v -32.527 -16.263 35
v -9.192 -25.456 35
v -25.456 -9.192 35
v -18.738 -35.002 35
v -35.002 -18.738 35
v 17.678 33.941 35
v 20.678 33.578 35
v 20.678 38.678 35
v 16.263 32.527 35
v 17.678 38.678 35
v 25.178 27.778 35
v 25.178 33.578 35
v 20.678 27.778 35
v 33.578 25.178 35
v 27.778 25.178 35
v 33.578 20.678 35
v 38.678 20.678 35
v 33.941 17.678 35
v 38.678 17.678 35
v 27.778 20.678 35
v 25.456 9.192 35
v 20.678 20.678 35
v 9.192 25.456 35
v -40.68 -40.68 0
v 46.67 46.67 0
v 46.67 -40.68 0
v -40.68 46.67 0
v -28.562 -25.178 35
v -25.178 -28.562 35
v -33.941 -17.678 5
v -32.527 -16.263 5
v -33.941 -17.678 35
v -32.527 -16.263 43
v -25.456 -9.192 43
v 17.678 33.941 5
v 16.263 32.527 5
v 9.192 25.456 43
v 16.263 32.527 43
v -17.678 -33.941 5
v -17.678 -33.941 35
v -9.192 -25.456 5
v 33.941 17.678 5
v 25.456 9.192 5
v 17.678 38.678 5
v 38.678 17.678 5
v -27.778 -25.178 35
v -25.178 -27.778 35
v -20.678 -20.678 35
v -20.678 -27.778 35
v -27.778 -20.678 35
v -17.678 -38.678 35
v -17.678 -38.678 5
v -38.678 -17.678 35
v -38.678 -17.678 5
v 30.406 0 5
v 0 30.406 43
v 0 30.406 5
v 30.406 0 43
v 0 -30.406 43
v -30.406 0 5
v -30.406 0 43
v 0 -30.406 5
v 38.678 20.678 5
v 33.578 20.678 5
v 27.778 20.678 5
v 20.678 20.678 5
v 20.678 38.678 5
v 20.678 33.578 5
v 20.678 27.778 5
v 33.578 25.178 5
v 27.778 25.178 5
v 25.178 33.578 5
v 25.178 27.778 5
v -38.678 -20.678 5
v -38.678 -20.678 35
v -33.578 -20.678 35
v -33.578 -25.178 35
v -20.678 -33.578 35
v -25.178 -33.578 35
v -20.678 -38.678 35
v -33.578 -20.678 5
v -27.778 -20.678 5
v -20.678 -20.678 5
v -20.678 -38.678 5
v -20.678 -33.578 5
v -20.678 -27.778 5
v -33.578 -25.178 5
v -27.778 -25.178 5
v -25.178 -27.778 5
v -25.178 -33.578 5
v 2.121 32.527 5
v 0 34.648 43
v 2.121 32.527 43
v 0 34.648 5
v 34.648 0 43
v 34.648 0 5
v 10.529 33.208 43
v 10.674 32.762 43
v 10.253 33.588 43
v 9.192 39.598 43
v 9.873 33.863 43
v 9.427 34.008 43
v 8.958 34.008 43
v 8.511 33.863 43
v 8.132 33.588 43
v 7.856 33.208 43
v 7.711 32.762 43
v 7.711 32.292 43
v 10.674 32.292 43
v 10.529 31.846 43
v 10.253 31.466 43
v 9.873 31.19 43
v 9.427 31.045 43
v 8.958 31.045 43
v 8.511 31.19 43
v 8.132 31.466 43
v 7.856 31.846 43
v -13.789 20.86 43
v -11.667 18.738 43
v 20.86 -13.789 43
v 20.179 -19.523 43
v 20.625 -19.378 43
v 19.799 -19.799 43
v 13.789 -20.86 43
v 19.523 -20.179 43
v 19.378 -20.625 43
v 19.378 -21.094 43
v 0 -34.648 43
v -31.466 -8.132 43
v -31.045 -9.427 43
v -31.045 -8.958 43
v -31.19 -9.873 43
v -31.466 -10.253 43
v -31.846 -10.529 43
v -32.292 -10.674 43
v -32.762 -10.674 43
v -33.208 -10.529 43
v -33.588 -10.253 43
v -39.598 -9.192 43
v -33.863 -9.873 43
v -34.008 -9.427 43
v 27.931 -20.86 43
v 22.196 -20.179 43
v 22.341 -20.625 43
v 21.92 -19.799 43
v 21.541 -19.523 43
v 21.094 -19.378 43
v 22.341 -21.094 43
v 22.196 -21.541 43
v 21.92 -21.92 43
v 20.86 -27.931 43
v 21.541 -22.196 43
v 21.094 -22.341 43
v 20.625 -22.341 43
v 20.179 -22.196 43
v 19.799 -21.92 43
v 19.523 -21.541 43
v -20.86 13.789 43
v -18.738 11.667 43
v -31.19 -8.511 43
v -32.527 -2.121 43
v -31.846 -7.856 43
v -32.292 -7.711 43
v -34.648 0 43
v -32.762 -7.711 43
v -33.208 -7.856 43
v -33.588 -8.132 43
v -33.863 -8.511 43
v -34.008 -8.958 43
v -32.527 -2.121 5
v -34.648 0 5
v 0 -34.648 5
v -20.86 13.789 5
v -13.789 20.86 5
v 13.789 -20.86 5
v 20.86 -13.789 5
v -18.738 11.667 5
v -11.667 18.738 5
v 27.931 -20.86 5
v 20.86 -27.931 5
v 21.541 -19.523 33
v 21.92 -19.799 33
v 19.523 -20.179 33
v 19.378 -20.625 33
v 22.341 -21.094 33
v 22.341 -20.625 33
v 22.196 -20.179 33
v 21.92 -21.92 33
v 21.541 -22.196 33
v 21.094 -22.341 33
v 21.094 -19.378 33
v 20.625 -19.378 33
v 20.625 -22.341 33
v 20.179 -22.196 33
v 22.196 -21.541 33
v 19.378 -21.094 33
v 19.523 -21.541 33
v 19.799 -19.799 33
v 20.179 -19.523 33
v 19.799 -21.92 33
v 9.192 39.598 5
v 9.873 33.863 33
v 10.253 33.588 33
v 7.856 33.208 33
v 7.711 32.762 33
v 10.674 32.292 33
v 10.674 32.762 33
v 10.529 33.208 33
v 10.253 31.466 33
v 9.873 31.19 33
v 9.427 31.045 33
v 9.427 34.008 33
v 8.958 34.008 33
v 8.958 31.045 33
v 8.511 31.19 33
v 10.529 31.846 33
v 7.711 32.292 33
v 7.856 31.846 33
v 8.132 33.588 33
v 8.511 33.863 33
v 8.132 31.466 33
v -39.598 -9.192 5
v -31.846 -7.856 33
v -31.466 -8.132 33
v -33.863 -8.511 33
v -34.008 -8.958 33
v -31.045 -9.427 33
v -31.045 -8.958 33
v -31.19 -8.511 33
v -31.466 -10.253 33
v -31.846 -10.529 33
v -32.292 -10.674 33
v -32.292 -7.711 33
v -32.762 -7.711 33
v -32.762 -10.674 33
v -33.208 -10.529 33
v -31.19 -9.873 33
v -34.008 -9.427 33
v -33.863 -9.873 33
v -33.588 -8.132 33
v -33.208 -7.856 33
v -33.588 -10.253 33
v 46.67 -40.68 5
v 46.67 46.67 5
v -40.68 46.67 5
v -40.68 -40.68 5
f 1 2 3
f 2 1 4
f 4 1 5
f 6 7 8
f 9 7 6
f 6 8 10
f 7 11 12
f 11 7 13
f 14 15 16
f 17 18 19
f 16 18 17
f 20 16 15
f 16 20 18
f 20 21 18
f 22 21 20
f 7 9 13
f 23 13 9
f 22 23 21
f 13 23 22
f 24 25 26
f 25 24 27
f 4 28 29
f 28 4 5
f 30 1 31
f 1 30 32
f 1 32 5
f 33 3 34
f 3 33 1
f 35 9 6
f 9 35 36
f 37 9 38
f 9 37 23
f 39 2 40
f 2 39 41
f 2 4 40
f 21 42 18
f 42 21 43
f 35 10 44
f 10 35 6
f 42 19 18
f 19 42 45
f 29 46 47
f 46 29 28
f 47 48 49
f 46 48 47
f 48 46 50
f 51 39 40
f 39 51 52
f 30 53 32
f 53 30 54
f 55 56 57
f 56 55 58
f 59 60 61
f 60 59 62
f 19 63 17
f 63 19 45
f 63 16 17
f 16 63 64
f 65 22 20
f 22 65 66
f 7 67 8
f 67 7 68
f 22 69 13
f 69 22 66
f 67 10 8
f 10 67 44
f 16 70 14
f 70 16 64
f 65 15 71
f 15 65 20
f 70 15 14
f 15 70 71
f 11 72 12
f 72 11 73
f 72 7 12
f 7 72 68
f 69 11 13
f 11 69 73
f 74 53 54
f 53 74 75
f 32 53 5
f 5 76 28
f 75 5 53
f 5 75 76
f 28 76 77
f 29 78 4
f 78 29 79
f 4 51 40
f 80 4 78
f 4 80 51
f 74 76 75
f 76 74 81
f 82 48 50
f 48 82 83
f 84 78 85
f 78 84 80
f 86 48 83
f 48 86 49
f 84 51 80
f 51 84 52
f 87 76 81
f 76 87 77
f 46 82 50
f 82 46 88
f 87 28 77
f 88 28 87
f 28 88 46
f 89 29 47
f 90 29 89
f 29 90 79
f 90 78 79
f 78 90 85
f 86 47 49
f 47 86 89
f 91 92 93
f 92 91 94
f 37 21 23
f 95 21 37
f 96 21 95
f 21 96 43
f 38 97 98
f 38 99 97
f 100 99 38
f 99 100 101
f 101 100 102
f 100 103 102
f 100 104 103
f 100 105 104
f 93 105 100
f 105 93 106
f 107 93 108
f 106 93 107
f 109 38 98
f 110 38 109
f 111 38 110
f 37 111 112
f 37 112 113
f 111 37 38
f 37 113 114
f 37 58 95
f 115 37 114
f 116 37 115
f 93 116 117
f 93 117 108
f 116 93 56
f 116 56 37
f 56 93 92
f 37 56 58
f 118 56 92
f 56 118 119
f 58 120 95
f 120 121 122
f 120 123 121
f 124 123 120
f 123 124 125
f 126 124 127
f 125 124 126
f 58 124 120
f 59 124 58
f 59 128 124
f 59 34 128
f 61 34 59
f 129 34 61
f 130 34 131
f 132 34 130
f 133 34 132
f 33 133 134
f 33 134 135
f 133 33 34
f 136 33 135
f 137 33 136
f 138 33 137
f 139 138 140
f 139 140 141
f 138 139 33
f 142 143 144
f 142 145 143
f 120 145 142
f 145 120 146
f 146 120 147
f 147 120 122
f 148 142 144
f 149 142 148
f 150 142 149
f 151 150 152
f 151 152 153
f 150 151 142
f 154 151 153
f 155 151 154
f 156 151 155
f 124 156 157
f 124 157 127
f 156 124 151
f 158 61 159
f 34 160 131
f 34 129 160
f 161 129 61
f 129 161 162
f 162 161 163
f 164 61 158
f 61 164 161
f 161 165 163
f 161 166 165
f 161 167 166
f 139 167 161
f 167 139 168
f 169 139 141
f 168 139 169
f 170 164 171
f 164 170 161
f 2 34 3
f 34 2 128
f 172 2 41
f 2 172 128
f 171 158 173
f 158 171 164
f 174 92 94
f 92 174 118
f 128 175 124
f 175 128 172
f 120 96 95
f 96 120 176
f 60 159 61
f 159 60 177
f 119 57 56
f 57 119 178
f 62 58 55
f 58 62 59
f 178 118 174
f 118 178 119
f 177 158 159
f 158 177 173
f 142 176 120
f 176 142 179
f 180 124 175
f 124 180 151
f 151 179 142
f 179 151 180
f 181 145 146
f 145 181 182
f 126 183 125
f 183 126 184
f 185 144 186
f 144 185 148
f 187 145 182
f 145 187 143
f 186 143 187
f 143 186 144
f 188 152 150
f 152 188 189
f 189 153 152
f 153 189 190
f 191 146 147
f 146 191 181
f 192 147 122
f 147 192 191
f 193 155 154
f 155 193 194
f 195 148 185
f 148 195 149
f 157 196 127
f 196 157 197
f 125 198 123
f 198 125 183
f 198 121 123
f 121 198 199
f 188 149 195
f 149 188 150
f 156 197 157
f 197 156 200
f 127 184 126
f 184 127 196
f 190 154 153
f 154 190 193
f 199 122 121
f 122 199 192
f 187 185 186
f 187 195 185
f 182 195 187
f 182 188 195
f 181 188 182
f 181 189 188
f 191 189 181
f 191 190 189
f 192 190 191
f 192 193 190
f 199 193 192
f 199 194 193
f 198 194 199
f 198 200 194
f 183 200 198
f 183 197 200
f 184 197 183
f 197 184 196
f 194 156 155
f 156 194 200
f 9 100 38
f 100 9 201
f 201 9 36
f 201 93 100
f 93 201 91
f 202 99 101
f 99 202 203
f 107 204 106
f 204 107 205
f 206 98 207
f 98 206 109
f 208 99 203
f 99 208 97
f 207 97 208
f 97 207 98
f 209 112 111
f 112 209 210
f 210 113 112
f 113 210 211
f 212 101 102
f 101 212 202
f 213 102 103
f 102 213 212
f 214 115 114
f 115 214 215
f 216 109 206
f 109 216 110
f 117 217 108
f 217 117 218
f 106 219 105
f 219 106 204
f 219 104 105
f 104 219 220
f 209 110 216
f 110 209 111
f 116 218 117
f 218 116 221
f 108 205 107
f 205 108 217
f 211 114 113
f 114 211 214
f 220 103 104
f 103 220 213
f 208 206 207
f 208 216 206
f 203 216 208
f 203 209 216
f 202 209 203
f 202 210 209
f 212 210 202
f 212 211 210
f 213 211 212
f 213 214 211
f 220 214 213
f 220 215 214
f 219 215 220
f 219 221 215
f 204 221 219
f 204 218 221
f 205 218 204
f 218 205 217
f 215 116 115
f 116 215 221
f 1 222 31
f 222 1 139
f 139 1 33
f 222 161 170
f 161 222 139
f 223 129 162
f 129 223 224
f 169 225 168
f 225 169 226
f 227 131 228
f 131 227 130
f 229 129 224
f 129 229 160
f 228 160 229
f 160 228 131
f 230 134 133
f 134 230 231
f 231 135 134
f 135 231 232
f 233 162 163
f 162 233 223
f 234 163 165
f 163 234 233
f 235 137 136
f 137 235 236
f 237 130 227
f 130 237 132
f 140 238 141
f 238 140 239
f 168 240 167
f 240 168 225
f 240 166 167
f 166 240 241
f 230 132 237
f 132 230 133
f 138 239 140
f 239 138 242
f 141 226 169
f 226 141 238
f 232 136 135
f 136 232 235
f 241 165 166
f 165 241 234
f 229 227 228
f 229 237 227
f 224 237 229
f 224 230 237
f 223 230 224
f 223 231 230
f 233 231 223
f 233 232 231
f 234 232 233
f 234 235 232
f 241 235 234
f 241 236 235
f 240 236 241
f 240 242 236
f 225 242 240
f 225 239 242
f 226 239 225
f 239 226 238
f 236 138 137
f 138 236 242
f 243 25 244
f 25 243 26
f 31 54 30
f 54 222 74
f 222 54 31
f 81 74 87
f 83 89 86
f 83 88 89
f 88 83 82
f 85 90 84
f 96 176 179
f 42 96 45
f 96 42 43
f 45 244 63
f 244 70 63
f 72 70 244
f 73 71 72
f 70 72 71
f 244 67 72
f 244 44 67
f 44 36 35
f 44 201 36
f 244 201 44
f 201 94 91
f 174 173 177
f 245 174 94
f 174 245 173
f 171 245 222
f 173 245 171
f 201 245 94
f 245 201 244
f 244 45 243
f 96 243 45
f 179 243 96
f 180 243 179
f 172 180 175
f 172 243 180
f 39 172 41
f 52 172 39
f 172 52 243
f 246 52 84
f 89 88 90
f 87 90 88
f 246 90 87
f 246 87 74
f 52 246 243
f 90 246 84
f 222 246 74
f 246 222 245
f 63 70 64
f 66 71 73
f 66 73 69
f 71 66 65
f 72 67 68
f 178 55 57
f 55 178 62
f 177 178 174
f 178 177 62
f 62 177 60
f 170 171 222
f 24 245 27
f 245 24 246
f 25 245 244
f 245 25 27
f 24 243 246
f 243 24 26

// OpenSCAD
$fn = 20;
epaisseurPlatine = 3;
tailleMoteur = 43;
hauteurMoteur = 40;

diametreTubeExt = 15.7;
diametreTige = 10.4;

translate([-40.68, -40.68, 0]) cube([87.35, 87.35, 5]);

rotate(45) {
	difference() {
		translate([-38, -11.5,0]) cube([76, 23, 35]);
		translate([25, 0,0]) rotate(-45) cube([20, 20, 35]);
		translate([-25, 0,0]) rotate(135) cube([20, 20, 35]);
		translate([-tailleMoteur / 2, -tailleMoteur / 2, -10]) cube([tailleMoteur, tailleMoteur, 60]);
	}
	translate([25, 0,0]) rotate(-45) extremite();
	translate([-25, 0,0]) rotate(135) extremite();
}

supportMoteur();

module extremite() {
	cube([21, 3, 35]);
	cube([3, 21, 35]);
	translate([10.1, 3, 0]) cube([5.8, 4.5, 35]);
	translate([3, 10.1, 0]) cube([4.5, 5.8, 35]);
}

module supportMoteur() {
	 rotate(45) union() {
		difference() {
			translate([-(tailleMoteur + 6) / 2, -(tailleMoteur + 6) / 2, 0]) 
				cube([tailleMoteur + 6, tailleMoteur + 6, hauteurMoteur + epaisseurPlatine]);
			translate([-tailleMoteur / 2, -tailleMoteur / 2, -10]) cube([tailleMoteur, tailleMoteur, 60]);
			translate([-5, 20, -10])cube([10, 10, 60]);
		}
		// Supports de vis
		translate([-5, -(tailleMoteur + 6) / 2 - 10, 0]) {
			difference() {
				cube([10, 10, hauteurMoteur + epaisseurPlatine]);
				translate([5, 5, hauteurMoteur + epaisseurPlatine]) cylinder(h = 20, r = 1.5, center = true); 
			}
		}
		translate([(tailleMoteur + 6) / 2, (tailleMoteur + 6) / 2 - 13, 0]) {
			difference() {
				cube([10, 10, hauteurMoteur + epaisseurPlatine]);
				translate([5, 5, hauteurMoteur + epaisseurPlatine]) cylinder(h = 20, r = 1.5, center = true); 
			}
		}
		translate([-(tailleMoteur + 6) / 2 - 10, (tailleMoteur + 6) / 2 - 13, 0]) {
			difference() {
				cube([10, 10, hauteurMoteur + epaisseurPlatine]);
				translate([5, 5, hauteurMoteur + epaisseurPlatine]) cylinder(h = 20, r = 1.5, center = true); 
			}
		}
	}
}
